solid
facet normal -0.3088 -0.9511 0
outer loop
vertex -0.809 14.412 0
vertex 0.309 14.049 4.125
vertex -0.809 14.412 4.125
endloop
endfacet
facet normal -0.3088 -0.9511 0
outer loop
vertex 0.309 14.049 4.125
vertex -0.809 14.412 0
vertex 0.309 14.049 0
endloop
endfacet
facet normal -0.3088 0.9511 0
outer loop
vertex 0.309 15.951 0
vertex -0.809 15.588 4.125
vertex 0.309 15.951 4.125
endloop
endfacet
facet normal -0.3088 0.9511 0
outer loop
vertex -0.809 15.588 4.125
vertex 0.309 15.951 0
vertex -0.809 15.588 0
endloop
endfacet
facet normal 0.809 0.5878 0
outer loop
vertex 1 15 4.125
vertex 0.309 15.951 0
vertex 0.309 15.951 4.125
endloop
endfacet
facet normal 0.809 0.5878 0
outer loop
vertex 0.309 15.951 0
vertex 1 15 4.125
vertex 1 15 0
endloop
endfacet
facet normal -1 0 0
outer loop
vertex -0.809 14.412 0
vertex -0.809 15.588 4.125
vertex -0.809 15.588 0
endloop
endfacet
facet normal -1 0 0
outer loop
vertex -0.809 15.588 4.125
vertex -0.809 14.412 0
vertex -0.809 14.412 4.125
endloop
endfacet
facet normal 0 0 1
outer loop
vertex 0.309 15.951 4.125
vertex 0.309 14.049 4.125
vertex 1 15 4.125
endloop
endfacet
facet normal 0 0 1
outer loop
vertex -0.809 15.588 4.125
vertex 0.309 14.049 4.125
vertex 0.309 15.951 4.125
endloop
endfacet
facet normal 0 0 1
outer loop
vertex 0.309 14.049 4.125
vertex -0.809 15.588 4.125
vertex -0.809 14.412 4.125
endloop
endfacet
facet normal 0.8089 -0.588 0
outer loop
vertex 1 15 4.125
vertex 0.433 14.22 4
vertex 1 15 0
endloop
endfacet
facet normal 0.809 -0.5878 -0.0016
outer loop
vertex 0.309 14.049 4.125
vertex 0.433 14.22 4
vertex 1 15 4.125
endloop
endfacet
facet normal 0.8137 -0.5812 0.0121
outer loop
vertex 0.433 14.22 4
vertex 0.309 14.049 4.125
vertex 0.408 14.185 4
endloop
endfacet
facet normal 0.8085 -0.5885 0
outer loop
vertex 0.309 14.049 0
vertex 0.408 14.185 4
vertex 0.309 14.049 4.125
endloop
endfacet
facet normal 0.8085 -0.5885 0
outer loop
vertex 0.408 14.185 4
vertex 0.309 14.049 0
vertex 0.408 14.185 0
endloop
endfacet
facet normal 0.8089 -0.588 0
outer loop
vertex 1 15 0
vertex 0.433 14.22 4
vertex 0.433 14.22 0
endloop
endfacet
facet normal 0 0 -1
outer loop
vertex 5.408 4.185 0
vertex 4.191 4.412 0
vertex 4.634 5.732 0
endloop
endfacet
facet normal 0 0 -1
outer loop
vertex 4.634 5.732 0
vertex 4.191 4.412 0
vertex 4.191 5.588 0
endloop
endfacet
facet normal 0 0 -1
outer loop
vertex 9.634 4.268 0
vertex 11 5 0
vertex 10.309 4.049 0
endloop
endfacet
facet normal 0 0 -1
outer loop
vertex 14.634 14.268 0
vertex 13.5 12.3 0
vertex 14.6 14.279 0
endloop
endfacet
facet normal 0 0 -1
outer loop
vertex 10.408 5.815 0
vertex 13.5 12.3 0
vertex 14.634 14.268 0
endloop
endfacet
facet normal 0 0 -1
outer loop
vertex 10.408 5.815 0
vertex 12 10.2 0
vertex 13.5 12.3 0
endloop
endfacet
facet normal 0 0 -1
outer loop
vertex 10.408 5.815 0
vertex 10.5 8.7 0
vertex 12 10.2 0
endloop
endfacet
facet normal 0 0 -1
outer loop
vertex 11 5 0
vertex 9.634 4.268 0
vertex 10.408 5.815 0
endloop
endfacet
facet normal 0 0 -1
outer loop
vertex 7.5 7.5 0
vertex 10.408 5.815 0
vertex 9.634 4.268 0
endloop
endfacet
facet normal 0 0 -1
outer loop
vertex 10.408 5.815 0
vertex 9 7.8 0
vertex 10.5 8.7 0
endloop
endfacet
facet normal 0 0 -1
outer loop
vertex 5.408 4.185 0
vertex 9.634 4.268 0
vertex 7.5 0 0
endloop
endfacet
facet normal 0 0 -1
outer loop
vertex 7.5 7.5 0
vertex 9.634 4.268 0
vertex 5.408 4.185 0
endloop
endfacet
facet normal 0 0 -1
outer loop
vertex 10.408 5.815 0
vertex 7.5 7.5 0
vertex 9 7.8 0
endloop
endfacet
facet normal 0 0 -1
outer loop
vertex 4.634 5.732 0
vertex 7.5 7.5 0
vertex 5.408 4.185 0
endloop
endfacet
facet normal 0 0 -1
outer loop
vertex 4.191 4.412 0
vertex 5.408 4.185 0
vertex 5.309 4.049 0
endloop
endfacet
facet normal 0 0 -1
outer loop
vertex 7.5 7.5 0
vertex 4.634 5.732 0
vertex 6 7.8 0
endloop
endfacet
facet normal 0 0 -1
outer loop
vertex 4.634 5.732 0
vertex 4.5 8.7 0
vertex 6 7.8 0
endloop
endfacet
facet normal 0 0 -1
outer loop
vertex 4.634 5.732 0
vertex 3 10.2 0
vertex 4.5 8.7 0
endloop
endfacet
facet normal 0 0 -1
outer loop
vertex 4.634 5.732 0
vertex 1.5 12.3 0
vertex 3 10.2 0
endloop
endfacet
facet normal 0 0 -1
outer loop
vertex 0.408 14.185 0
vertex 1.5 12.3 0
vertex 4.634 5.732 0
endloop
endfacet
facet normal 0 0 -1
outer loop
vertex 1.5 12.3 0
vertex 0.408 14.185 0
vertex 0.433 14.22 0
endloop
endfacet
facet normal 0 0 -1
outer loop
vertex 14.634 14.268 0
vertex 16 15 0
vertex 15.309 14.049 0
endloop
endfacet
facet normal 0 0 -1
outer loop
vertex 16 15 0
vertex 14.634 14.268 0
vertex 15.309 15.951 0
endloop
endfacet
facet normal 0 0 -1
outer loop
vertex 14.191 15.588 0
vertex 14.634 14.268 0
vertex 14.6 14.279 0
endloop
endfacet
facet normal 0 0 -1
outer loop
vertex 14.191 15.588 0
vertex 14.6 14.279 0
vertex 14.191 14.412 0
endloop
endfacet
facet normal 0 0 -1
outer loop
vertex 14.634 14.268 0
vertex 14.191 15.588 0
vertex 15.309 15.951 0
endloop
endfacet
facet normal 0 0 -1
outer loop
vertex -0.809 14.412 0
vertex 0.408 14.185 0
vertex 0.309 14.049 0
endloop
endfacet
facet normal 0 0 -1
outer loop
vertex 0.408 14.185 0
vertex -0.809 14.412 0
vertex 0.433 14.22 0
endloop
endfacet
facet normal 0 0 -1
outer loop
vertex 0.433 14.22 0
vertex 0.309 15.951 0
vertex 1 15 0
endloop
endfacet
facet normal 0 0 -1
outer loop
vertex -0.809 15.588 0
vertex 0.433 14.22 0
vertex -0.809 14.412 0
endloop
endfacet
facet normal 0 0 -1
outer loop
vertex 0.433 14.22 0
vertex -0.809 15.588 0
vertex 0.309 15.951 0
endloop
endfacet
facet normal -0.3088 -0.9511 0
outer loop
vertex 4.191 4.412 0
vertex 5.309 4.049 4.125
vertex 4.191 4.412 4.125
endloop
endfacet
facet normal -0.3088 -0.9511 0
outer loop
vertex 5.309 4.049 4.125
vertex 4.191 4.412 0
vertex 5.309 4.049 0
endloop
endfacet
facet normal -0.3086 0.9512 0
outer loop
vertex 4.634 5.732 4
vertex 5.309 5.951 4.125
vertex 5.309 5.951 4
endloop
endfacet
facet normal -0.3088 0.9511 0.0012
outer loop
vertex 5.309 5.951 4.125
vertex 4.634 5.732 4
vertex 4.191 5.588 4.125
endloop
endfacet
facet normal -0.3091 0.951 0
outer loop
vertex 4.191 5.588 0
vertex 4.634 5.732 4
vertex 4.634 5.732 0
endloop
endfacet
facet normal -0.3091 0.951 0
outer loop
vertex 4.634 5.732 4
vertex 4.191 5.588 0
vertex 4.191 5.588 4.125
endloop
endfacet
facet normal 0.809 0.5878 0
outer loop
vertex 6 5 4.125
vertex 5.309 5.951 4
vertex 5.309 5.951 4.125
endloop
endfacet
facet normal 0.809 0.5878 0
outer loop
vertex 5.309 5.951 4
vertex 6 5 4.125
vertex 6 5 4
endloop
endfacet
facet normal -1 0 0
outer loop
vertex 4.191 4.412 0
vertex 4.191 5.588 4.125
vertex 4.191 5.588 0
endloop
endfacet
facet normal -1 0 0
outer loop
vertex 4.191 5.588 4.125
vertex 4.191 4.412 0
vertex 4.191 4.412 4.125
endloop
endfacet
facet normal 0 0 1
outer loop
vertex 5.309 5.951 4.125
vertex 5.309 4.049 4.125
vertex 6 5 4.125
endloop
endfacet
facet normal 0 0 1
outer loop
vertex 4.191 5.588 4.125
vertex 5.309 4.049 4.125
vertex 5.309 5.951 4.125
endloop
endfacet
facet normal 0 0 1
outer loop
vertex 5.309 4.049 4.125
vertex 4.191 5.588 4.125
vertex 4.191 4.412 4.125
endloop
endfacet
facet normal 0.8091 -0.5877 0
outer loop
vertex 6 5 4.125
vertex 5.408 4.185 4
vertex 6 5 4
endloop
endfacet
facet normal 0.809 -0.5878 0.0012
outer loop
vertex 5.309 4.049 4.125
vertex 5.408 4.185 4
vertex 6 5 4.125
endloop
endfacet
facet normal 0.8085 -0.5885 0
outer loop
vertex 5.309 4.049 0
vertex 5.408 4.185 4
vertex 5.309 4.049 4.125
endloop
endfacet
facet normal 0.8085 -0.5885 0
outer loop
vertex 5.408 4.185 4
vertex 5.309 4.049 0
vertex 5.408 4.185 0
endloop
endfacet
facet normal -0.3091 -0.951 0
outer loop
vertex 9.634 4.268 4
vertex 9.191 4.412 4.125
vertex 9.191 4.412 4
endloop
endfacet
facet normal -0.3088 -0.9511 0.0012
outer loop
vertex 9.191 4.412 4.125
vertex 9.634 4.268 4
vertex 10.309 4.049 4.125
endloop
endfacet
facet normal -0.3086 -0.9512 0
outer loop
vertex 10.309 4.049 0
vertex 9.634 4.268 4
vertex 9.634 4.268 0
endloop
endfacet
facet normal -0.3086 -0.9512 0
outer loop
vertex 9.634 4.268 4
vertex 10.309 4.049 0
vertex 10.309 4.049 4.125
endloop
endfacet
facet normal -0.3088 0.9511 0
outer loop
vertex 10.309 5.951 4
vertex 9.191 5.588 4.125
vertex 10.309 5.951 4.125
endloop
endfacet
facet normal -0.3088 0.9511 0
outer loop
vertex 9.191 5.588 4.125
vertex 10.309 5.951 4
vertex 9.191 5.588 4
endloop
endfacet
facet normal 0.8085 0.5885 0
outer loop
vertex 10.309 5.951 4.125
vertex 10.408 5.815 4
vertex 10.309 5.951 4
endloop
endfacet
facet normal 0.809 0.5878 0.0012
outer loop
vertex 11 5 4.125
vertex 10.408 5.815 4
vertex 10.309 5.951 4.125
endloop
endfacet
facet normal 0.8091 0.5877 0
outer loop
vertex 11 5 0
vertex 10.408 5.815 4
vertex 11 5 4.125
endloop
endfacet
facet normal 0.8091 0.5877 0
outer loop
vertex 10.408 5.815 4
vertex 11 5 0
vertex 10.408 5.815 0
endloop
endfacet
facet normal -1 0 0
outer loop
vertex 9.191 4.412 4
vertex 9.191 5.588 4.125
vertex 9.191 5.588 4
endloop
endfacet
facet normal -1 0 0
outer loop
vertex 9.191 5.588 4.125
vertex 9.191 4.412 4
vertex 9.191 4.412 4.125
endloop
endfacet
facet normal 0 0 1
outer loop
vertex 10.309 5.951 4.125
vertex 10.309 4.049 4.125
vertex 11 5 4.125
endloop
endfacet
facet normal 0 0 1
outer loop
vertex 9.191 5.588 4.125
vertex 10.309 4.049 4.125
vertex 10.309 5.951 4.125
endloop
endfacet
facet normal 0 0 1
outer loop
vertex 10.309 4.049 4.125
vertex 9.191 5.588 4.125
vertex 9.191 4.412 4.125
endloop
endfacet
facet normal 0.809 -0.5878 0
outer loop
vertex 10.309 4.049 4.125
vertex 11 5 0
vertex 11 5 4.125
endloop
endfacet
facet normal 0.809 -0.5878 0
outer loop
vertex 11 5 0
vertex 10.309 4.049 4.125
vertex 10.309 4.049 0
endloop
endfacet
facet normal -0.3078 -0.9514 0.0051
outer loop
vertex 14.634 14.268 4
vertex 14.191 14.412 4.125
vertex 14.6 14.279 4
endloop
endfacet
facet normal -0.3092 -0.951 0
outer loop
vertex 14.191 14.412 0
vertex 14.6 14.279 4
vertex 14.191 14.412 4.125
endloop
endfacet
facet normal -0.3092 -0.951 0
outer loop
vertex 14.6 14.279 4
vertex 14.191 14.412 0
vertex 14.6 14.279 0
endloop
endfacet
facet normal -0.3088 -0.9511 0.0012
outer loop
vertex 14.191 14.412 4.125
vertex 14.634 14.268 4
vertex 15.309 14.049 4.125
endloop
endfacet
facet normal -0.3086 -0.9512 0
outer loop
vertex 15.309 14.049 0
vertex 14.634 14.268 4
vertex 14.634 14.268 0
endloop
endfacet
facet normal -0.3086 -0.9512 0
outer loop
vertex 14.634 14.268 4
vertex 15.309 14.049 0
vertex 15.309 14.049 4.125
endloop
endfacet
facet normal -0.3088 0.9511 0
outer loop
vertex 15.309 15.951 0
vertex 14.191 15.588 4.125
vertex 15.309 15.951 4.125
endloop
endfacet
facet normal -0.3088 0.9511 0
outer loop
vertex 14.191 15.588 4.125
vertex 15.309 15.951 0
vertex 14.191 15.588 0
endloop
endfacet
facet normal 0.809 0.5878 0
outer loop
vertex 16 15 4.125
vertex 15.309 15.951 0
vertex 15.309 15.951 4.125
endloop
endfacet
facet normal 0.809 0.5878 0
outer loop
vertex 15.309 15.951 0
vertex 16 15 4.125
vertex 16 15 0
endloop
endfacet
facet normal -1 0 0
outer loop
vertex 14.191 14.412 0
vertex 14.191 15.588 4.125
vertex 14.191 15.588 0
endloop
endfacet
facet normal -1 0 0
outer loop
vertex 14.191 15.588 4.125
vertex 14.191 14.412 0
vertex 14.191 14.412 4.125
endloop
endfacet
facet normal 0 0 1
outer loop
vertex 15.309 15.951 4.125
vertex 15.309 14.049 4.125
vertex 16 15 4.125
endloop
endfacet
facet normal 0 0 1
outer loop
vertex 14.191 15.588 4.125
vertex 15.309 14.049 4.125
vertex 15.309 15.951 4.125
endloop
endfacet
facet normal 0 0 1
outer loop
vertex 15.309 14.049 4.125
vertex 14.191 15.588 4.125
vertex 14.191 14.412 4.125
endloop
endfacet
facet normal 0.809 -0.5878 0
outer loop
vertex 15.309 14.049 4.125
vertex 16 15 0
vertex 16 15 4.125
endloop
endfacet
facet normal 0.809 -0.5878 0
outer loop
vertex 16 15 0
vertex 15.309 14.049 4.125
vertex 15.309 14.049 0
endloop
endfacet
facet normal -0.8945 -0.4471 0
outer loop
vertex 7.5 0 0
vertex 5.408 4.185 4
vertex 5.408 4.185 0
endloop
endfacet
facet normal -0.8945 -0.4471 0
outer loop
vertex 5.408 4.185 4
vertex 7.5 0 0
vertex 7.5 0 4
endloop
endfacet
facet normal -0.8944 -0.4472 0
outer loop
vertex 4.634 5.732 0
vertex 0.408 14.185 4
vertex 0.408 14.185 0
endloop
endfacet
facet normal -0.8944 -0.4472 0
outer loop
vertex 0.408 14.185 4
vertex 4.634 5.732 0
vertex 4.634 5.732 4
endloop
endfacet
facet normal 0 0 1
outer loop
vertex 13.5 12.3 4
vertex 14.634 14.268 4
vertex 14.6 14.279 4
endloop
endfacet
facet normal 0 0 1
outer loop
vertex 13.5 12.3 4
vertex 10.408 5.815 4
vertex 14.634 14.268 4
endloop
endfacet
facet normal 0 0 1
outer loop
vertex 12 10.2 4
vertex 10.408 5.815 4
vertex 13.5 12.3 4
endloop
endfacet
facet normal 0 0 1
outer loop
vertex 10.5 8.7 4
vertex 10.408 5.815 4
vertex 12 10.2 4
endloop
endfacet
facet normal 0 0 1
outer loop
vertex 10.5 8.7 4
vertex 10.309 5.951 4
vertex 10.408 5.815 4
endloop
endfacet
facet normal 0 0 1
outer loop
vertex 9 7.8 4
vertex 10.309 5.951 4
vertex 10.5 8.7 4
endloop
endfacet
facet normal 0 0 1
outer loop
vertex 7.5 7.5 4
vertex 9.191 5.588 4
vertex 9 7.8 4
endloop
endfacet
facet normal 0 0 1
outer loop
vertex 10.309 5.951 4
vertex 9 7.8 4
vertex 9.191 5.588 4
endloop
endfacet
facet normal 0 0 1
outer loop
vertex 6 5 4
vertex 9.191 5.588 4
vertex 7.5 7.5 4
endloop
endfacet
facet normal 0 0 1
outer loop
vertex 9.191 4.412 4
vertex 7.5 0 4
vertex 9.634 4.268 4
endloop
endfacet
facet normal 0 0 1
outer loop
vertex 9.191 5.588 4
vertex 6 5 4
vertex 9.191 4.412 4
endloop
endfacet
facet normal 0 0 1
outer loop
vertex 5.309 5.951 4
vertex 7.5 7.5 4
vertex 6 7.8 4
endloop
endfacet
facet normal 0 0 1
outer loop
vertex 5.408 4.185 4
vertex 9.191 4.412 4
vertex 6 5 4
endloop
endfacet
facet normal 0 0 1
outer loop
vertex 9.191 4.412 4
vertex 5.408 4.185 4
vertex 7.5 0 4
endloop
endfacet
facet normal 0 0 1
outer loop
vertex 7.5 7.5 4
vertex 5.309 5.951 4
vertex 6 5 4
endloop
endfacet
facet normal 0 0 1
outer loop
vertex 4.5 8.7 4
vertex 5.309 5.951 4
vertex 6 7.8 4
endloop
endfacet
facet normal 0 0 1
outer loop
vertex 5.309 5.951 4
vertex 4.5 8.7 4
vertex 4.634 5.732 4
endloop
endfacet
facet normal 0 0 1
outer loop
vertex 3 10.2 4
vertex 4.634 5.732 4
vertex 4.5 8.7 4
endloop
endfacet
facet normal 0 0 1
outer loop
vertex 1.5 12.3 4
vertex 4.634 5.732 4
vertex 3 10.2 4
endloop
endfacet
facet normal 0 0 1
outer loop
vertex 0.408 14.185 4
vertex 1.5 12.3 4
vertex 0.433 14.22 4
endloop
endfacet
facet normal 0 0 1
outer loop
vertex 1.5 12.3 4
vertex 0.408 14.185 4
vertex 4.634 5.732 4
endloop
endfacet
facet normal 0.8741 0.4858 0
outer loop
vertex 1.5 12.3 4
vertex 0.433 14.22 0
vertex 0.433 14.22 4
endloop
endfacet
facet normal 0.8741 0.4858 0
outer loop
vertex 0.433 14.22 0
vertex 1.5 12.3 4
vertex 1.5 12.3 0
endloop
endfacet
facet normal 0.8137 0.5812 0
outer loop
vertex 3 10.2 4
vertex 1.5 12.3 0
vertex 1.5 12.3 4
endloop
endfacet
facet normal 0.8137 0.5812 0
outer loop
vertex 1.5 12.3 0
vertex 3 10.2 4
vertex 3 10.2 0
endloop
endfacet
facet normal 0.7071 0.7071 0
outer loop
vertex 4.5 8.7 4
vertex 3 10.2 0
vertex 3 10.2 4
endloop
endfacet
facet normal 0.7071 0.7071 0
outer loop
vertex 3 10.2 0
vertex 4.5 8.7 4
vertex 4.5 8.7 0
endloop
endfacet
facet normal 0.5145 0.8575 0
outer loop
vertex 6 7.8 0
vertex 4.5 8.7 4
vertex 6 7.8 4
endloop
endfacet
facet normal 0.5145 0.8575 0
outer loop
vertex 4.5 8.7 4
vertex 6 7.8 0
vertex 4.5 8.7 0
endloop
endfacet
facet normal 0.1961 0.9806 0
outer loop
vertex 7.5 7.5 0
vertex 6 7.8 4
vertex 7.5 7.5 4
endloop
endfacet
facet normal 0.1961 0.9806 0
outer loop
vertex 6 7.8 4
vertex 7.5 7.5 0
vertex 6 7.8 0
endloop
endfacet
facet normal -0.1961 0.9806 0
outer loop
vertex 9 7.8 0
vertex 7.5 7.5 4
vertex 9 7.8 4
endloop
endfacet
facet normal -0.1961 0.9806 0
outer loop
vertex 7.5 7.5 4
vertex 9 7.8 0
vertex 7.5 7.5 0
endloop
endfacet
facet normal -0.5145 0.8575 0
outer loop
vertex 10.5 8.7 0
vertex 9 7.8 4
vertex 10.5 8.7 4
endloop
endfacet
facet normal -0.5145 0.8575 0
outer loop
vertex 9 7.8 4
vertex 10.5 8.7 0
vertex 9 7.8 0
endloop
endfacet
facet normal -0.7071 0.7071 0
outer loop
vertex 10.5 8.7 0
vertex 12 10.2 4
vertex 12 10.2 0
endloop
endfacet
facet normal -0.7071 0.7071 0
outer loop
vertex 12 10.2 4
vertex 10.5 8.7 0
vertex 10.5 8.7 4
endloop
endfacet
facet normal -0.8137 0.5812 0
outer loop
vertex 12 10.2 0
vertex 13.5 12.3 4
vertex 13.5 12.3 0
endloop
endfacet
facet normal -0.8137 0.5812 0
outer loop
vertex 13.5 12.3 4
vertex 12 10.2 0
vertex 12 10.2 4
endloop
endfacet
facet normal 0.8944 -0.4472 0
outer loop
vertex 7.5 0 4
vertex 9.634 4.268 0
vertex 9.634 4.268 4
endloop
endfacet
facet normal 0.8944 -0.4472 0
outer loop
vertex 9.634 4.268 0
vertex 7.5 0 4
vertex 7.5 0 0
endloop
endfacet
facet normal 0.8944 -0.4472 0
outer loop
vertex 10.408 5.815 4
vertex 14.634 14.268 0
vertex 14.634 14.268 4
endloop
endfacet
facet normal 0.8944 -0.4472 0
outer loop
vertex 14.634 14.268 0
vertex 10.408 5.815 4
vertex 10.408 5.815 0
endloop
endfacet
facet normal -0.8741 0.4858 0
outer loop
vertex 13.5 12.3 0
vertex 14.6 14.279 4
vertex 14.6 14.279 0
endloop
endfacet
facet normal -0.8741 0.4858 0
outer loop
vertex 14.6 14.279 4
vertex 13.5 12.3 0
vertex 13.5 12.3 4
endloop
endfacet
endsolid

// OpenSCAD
joinfactor = 0.125;

gFocalPoint = [0,0];
gSteps = 10;
gHeight = 4;

BezQuadCurve( [[0, 15],[5,5],[10,5],[15,15]], [7.5,0], gSteps, gHeight);

//=======================================
// Functions
//=======================================
function BEZ03(u) = pow((1-u), 3);
function BEZ13(u) = 3*u*(pow((1-u),2));
function BEZ23(u) = 3*(pow(u,2))*(1-u);
function BEZ33(u) = pow(u,3);

function PointAlongBez4(p0, p1, p2, p3, u) = [
	BEZ03(u)*p0[0]+BEZ13(u)*p1[0]+BEZ23(u)*p2[0]+BEZ33(u)*p3[0],
	BEZ03(u)*p0[1]+BEZ13(u)*p1[1]+BEZ23(u)*p2[1]+BEZ33(u)*p3[1]];

//=======================================
// Modules
//=======================================
// c - ControlPoints
module BezQuadCurve(c, focalPoint, steps=gSteps, height=gHeight)
{
	// Draw control points
	// Just comment this out when you're doing the real thing
	for(point=[0:3])
	{
		translate(c[point])
		color([1,0,0])
		cylinder(r=1, h=height+joinfactor);
	}

	for(step = [steps:1])
	{
		linear_extrude(height = height, convexity = 10) 
		polygon(
			points=[
				focalPoint,
				PointAlongBez4(c[0], c[1], c[2],c[3], step/steps),
				PointAlongBez4(c[0], c[1], c[2],c[3], (step-1)/steps)],
			paths=[[0,1,2,0]]
		);
	}
}

//==============================================
// Test functions
//==============================================
//PlotBEZ0(100);
//PlotBEZ1(100);
//PlotBEZ2(100);
//PlotBEZ3(100);
//PlotBez4Blending();


module PlotBEZ0(steps)
{
	cubeSize = 1;
	cubeHeight = steps;

	for (step=[0:steps])
	{
		translate([cubeSize*step, 0, 0])
		cube(size=[cubeSize, cubeSize, BEZ03(step/steps)*cubeHeight]);
	}	
}

module PlotBEZ1(steps)
{
	cubeSize = 1;
	cubeHeight = steps;

	for (step=[0:steps])
	{
		translate([cubeSize*step, 0, 0])
		cube(size=[cubeSize, cubeSize, BEZ13(step/steps)*cubeHeight]);
	}	
}

module PlotBEZ2(steps)
{
	cubeSize = 1;
	cubeHeight = steps;

	for (step=[0:steps])
	{
		translate([cubeSize*step, 0, 0])
		cube(size=[cubeSize, cubeSize, BEZ23(step/steps)*cubeHeight]);
	}	
}

module PlotBEZ3(steps)
{
	cubeSize = 1;
	cubeHeight = steps;

	for (step=[0:steps])
	{
		translate([cubeSize*step, 0, 0])
		cube(size=[cubeSize, cubeSize, BEZ33(step/steps)*cubeHeight]);
	}	
}

module PlotBez4Blending()
{
	sizing = 100;

	translate([0, 0, sizing + 10])
	PlotBEZ0(100);

	translate([sizing+10, 0, sizing + 10])
	PlotBEZ1(100);

	translate([0, 0, 0])
	PlotBEZ2(100);

	translate([sizing+10, 0, 0])
	PlotBEZ3(100);
}
